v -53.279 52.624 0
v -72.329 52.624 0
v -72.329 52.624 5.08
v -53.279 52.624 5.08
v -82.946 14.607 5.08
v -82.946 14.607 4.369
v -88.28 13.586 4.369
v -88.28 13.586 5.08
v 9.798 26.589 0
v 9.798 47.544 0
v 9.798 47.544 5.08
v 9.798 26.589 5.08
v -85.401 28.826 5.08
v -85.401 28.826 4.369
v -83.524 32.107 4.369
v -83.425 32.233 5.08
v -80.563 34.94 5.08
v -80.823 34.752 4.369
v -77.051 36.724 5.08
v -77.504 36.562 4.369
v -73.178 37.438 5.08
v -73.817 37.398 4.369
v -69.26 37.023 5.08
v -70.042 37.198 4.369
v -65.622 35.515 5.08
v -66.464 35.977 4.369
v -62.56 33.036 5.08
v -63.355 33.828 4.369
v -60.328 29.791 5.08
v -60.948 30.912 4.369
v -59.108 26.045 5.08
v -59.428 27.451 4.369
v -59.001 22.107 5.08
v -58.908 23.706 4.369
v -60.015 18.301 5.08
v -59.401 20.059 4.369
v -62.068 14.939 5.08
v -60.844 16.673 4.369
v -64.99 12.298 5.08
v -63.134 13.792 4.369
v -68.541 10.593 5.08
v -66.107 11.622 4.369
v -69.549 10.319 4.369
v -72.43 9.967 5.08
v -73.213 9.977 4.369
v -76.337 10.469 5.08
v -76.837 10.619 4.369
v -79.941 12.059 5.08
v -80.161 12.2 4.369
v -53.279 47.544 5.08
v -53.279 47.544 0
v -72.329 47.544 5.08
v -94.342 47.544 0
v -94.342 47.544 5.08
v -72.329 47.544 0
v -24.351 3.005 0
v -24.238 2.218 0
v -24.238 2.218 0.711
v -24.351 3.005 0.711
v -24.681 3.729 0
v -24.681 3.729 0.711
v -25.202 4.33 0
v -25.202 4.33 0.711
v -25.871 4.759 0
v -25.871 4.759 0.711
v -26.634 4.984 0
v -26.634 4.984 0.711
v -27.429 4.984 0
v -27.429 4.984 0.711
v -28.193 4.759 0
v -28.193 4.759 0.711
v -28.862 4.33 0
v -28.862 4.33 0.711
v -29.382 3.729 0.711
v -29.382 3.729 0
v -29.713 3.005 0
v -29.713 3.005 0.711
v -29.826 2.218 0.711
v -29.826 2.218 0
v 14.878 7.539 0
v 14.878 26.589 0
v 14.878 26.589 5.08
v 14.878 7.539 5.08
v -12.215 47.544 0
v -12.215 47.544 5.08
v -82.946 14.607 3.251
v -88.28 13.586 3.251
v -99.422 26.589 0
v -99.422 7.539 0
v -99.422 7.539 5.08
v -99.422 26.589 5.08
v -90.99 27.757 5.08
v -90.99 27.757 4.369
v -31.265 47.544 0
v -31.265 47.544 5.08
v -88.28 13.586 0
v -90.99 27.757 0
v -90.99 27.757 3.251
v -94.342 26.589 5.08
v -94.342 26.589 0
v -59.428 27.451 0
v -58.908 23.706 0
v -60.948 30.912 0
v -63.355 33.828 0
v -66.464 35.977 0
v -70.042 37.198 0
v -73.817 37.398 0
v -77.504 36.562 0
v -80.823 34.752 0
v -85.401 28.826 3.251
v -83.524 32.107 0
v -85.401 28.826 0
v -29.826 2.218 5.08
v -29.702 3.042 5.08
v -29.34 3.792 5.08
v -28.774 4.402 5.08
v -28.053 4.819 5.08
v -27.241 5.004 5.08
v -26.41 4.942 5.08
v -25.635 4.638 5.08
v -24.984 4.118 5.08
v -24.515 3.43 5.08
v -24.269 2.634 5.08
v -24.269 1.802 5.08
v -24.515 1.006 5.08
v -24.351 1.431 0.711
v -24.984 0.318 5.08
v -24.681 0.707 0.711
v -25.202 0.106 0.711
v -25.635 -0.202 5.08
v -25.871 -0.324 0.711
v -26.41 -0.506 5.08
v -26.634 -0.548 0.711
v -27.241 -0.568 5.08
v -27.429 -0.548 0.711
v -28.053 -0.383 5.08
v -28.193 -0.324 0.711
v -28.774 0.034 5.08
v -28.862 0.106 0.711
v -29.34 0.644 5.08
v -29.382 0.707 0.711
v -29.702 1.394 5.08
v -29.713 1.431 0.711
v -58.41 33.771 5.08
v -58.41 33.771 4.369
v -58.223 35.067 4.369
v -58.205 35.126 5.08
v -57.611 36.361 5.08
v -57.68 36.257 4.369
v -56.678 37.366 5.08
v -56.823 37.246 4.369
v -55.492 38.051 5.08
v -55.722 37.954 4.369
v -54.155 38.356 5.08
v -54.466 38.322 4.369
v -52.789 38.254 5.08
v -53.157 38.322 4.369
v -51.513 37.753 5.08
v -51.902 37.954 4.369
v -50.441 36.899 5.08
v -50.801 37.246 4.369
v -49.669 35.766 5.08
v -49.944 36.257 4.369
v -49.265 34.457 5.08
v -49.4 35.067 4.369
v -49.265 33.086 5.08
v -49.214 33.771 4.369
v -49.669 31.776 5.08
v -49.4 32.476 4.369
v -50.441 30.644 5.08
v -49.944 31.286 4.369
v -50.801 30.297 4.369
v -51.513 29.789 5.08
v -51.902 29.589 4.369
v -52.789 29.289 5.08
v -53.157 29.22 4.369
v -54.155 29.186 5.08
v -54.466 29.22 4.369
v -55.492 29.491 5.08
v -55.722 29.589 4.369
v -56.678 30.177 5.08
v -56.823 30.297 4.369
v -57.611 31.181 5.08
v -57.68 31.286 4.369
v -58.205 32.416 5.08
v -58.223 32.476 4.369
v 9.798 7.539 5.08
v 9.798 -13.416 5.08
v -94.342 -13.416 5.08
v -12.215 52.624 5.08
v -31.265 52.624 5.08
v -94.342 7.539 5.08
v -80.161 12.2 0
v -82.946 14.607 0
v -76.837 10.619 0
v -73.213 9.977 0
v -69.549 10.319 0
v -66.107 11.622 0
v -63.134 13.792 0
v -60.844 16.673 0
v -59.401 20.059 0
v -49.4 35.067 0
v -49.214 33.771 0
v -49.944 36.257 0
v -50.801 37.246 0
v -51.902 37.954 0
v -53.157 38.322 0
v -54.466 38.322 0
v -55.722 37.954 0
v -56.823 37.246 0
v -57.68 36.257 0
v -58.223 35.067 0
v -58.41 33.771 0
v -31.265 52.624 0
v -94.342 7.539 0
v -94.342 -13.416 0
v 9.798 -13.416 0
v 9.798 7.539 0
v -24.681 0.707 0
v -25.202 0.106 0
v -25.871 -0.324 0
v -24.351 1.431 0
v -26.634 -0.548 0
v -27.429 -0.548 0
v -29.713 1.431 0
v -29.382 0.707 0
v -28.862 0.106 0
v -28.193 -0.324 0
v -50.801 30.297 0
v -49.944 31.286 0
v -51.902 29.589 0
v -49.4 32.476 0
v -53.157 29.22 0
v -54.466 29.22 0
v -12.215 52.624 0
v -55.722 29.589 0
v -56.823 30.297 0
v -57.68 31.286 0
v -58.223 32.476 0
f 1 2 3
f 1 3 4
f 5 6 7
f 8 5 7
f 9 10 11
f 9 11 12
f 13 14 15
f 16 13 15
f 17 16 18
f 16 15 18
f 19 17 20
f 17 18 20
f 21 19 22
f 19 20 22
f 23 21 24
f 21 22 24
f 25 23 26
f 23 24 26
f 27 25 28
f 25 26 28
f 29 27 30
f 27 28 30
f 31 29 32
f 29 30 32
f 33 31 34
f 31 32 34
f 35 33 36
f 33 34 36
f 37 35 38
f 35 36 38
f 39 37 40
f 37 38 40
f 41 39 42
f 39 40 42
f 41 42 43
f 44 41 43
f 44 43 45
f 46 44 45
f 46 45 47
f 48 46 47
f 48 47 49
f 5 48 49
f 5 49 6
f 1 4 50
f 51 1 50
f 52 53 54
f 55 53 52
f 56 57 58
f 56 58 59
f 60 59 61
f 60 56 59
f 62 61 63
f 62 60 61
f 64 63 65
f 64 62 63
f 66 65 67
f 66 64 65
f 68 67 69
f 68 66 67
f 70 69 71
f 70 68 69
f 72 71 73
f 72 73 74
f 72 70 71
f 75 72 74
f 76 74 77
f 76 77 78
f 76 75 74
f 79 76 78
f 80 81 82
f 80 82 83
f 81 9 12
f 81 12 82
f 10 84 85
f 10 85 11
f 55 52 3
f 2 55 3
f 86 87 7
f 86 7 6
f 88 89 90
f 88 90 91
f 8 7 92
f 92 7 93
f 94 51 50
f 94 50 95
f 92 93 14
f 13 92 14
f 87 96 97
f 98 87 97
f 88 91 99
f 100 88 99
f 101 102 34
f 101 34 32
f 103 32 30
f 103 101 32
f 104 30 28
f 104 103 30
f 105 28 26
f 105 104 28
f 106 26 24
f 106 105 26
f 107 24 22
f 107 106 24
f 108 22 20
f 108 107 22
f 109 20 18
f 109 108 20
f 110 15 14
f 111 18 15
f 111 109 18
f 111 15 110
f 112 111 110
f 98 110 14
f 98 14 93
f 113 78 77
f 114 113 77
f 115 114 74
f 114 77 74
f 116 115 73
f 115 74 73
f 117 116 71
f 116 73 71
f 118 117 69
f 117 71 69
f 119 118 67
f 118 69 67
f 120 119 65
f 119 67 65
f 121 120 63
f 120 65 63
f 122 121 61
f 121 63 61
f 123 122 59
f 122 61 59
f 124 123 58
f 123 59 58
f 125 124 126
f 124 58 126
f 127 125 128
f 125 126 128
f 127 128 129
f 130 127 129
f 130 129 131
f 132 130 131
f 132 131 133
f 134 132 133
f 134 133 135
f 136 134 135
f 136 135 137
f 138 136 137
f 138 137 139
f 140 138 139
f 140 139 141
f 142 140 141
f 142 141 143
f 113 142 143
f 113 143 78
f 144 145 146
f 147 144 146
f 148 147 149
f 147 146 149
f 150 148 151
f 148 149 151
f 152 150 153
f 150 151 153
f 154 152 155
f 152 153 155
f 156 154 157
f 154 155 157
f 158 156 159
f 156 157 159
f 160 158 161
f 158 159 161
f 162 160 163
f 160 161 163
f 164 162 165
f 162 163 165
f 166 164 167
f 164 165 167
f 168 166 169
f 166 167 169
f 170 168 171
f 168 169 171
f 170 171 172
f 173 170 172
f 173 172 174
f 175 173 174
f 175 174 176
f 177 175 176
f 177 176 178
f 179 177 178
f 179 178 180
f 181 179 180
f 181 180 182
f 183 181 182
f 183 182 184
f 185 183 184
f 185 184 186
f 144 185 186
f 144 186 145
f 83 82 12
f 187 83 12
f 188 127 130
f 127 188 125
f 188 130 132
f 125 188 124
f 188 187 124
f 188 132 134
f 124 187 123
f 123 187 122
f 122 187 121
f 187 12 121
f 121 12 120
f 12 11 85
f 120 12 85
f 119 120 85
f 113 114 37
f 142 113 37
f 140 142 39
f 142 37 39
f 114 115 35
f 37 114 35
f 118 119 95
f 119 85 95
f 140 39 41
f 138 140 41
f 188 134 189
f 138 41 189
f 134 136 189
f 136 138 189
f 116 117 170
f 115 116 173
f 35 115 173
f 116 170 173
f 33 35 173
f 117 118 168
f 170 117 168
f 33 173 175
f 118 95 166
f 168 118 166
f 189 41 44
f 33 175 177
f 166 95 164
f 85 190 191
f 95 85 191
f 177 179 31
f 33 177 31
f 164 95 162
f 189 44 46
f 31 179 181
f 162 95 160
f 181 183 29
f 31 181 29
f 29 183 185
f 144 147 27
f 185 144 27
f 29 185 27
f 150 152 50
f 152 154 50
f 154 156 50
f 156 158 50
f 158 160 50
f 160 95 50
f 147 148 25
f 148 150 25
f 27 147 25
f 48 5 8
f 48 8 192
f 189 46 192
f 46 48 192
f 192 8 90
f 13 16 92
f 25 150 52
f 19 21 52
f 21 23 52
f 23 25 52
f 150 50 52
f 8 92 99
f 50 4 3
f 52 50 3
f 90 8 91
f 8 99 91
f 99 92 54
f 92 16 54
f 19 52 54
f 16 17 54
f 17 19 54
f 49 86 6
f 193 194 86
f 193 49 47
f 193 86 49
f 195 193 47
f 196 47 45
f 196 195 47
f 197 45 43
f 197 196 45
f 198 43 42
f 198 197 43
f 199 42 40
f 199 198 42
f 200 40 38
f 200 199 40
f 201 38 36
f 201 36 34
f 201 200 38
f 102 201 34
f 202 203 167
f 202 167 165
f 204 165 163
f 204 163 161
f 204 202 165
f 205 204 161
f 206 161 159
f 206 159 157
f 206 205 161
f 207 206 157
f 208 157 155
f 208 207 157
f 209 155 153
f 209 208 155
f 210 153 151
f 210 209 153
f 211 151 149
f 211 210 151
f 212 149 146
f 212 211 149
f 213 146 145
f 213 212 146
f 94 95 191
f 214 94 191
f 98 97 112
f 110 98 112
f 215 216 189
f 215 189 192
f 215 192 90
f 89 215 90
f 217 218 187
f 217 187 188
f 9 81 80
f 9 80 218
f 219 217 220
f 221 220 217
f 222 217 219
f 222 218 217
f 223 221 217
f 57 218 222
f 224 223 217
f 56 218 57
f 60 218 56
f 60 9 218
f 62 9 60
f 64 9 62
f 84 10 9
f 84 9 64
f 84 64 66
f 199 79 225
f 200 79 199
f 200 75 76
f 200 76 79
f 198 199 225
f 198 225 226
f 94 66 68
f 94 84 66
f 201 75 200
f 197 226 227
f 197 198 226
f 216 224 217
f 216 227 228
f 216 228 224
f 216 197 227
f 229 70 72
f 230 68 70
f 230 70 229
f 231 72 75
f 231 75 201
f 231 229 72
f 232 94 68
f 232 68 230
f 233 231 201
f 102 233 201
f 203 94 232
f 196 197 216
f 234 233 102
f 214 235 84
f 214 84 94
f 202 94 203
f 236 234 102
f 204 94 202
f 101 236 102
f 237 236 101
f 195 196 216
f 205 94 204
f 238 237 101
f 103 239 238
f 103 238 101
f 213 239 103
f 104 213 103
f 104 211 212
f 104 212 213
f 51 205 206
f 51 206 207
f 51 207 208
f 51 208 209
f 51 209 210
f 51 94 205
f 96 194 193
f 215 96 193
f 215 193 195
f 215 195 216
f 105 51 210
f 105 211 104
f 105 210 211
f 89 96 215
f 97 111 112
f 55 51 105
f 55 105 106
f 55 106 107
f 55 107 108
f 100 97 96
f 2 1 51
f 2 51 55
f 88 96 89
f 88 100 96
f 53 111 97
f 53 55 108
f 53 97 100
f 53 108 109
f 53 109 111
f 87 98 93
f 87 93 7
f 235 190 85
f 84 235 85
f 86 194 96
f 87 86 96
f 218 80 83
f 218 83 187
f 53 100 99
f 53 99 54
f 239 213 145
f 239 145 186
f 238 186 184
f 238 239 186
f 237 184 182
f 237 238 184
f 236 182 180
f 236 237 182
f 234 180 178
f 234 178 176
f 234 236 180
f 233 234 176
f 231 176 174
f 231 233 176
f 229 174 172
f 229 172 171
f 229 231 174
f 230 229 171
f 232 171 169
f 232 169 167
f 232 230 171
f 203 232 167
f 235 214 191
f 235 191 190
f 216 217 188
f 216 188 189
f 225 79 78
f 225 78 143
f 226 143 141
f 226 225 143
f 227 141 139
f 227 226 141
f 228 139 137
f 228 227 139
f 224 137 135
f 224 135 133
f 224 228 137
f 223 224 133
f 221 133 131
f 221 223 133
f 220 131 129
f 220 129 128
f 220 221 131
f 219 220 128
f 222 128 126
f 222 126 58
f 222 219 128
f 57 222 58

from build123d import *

# Parameters (mm, degrees)
BOSS_EXTRUDE1_DEPTH = 5.08
CAVITY2_OUTLINE_R   = 4.59774385
CAVITY2_OUTLINE_R_2 = 13.7414
CAVITY2_DEPTH       = 4.3688
CAVITY2_START       = 3.2512
CAVITY2_2_DEPTH     = 1.1176
CAVITY2_3_OUTLINE_R = 2.794
CAVITY2_3_DEPTH     = 0.7112
SKETCH10_R          = 4.59774385
SKETCH10_R_2        = 2.794
CUT_EXTRUDE1_DEPTH  = 5.08


# Read off the part's stored shape, not the designer's step: Cavity2
with BuildPart() as part:
    # Sketch1 → Boss-Extrude1 (new body)
    with BuildSketch(Plane.XY):
        Polygon((-94.341860078, 47.544254219), (-72.328526744, 47.544254219), (-72.328526744, 52.624254219), (-53.278526744, 52.624254219), (-53.278526744, 47.544254219), (-31.265193411, 47.544254219), (-31.265193411, 52.624254219), (-12.215193411, 52.624254219), (-12.215193411, 47.544254219), (9.798139922, 47.544254219), (9.798139922, 26.589254219), (14.878139922, 26.589254219), (14.878139922, 7.539254219), (9.798139922, 7.539254219), (9.798139922, -13.415745781), (-94.341860078, -13.415745781), (-94.341860078, 7.539254219), (-99.421860078, 7.539254219), (-99.421860078, 26.589254219), (-94.341860078, 26.589254219), align=None)
    extrude(amount=BOSS_EXTRUDE1_DEPTH)

    # Cavity2 outline → Cavity2 (cut)
    with BuildSketch(Plane.XY):
        with Locations((-53.811820296, 33.77125273)):
            Circle(CAVITY2_OUTLINE_R)
        with Locations((-72.649126193, 23.706396)):
            Circle(CAVITY2_OUTLINE_R_2)
    extrude(amount=CAVITY2_DEPTH, mode=Mode.SUBTRACT)

    # Cavity2 2 outline → Cavity2 2 (cut)
    with BuildSketch(Plane.XY.offset(CAVITY2_START)):
        with BuildLine():
            Line((-85.401408895, 28.825513097), (-90.989734661, 27.7567927))
            Line((-90.989734661, 27.7567927), (-88.279765083, 13.586395221))
            Line((-88.279765083, 13.586395221), (-82.945631867, 14.606503426))
            ThreePointArc((-82.945631867, 14.606503426), (-86.190053798, 21.367731092), (-85.401408895, 28.825513097))
        make_face()
    extrude(amount=CAVITY2_2_DEPTH, mode=Mode.SUBTRACT)

    # Cavity2 3 outline → Cavity2 3 (cut)
    with BuildSketch(Plane.XY):
        with Locations((-27.031860078, 2.217954219)):
            Circle(CAVITY2_3_OUTLINE_R)
    extrude(amount=CAVITY2_3_DEPTH, mode=Mode.SUBTRACT)

    # Sketch10 → Cut-Extrude1 (cut)
    with BuildSketch(Plane(origin=(0, 0, 0), x_dir=(-1, 0, 0), z_dir=(0, 0, -1))):
        with Locations((53.811820296, 33.77125273)):
            Circle(SKETCH10_R)
        with Locations((27.031860078, 2.217954219)):
            Circle(SKETCH10_R_2)
        with BuildLine():
            Line((82.945631867, 14.606503426), (88.279765083, 13.586395221))
            Line((88.279765083, 13.586395221), (90.989734661, 27.7567927))
            Line((90.989734661, 27.7567927), (85.401408894, 28.825513097))
            ThreePointArc((85.401408894, 28.825513097), (59.108198587, 26.045060907), (82.945631867, 14.606503426))
        make_face()
    extrude(amount=-CUT_EXTRUDE1_DEPTH, mode=Mode.SUBTRACT)


solid = part.part
